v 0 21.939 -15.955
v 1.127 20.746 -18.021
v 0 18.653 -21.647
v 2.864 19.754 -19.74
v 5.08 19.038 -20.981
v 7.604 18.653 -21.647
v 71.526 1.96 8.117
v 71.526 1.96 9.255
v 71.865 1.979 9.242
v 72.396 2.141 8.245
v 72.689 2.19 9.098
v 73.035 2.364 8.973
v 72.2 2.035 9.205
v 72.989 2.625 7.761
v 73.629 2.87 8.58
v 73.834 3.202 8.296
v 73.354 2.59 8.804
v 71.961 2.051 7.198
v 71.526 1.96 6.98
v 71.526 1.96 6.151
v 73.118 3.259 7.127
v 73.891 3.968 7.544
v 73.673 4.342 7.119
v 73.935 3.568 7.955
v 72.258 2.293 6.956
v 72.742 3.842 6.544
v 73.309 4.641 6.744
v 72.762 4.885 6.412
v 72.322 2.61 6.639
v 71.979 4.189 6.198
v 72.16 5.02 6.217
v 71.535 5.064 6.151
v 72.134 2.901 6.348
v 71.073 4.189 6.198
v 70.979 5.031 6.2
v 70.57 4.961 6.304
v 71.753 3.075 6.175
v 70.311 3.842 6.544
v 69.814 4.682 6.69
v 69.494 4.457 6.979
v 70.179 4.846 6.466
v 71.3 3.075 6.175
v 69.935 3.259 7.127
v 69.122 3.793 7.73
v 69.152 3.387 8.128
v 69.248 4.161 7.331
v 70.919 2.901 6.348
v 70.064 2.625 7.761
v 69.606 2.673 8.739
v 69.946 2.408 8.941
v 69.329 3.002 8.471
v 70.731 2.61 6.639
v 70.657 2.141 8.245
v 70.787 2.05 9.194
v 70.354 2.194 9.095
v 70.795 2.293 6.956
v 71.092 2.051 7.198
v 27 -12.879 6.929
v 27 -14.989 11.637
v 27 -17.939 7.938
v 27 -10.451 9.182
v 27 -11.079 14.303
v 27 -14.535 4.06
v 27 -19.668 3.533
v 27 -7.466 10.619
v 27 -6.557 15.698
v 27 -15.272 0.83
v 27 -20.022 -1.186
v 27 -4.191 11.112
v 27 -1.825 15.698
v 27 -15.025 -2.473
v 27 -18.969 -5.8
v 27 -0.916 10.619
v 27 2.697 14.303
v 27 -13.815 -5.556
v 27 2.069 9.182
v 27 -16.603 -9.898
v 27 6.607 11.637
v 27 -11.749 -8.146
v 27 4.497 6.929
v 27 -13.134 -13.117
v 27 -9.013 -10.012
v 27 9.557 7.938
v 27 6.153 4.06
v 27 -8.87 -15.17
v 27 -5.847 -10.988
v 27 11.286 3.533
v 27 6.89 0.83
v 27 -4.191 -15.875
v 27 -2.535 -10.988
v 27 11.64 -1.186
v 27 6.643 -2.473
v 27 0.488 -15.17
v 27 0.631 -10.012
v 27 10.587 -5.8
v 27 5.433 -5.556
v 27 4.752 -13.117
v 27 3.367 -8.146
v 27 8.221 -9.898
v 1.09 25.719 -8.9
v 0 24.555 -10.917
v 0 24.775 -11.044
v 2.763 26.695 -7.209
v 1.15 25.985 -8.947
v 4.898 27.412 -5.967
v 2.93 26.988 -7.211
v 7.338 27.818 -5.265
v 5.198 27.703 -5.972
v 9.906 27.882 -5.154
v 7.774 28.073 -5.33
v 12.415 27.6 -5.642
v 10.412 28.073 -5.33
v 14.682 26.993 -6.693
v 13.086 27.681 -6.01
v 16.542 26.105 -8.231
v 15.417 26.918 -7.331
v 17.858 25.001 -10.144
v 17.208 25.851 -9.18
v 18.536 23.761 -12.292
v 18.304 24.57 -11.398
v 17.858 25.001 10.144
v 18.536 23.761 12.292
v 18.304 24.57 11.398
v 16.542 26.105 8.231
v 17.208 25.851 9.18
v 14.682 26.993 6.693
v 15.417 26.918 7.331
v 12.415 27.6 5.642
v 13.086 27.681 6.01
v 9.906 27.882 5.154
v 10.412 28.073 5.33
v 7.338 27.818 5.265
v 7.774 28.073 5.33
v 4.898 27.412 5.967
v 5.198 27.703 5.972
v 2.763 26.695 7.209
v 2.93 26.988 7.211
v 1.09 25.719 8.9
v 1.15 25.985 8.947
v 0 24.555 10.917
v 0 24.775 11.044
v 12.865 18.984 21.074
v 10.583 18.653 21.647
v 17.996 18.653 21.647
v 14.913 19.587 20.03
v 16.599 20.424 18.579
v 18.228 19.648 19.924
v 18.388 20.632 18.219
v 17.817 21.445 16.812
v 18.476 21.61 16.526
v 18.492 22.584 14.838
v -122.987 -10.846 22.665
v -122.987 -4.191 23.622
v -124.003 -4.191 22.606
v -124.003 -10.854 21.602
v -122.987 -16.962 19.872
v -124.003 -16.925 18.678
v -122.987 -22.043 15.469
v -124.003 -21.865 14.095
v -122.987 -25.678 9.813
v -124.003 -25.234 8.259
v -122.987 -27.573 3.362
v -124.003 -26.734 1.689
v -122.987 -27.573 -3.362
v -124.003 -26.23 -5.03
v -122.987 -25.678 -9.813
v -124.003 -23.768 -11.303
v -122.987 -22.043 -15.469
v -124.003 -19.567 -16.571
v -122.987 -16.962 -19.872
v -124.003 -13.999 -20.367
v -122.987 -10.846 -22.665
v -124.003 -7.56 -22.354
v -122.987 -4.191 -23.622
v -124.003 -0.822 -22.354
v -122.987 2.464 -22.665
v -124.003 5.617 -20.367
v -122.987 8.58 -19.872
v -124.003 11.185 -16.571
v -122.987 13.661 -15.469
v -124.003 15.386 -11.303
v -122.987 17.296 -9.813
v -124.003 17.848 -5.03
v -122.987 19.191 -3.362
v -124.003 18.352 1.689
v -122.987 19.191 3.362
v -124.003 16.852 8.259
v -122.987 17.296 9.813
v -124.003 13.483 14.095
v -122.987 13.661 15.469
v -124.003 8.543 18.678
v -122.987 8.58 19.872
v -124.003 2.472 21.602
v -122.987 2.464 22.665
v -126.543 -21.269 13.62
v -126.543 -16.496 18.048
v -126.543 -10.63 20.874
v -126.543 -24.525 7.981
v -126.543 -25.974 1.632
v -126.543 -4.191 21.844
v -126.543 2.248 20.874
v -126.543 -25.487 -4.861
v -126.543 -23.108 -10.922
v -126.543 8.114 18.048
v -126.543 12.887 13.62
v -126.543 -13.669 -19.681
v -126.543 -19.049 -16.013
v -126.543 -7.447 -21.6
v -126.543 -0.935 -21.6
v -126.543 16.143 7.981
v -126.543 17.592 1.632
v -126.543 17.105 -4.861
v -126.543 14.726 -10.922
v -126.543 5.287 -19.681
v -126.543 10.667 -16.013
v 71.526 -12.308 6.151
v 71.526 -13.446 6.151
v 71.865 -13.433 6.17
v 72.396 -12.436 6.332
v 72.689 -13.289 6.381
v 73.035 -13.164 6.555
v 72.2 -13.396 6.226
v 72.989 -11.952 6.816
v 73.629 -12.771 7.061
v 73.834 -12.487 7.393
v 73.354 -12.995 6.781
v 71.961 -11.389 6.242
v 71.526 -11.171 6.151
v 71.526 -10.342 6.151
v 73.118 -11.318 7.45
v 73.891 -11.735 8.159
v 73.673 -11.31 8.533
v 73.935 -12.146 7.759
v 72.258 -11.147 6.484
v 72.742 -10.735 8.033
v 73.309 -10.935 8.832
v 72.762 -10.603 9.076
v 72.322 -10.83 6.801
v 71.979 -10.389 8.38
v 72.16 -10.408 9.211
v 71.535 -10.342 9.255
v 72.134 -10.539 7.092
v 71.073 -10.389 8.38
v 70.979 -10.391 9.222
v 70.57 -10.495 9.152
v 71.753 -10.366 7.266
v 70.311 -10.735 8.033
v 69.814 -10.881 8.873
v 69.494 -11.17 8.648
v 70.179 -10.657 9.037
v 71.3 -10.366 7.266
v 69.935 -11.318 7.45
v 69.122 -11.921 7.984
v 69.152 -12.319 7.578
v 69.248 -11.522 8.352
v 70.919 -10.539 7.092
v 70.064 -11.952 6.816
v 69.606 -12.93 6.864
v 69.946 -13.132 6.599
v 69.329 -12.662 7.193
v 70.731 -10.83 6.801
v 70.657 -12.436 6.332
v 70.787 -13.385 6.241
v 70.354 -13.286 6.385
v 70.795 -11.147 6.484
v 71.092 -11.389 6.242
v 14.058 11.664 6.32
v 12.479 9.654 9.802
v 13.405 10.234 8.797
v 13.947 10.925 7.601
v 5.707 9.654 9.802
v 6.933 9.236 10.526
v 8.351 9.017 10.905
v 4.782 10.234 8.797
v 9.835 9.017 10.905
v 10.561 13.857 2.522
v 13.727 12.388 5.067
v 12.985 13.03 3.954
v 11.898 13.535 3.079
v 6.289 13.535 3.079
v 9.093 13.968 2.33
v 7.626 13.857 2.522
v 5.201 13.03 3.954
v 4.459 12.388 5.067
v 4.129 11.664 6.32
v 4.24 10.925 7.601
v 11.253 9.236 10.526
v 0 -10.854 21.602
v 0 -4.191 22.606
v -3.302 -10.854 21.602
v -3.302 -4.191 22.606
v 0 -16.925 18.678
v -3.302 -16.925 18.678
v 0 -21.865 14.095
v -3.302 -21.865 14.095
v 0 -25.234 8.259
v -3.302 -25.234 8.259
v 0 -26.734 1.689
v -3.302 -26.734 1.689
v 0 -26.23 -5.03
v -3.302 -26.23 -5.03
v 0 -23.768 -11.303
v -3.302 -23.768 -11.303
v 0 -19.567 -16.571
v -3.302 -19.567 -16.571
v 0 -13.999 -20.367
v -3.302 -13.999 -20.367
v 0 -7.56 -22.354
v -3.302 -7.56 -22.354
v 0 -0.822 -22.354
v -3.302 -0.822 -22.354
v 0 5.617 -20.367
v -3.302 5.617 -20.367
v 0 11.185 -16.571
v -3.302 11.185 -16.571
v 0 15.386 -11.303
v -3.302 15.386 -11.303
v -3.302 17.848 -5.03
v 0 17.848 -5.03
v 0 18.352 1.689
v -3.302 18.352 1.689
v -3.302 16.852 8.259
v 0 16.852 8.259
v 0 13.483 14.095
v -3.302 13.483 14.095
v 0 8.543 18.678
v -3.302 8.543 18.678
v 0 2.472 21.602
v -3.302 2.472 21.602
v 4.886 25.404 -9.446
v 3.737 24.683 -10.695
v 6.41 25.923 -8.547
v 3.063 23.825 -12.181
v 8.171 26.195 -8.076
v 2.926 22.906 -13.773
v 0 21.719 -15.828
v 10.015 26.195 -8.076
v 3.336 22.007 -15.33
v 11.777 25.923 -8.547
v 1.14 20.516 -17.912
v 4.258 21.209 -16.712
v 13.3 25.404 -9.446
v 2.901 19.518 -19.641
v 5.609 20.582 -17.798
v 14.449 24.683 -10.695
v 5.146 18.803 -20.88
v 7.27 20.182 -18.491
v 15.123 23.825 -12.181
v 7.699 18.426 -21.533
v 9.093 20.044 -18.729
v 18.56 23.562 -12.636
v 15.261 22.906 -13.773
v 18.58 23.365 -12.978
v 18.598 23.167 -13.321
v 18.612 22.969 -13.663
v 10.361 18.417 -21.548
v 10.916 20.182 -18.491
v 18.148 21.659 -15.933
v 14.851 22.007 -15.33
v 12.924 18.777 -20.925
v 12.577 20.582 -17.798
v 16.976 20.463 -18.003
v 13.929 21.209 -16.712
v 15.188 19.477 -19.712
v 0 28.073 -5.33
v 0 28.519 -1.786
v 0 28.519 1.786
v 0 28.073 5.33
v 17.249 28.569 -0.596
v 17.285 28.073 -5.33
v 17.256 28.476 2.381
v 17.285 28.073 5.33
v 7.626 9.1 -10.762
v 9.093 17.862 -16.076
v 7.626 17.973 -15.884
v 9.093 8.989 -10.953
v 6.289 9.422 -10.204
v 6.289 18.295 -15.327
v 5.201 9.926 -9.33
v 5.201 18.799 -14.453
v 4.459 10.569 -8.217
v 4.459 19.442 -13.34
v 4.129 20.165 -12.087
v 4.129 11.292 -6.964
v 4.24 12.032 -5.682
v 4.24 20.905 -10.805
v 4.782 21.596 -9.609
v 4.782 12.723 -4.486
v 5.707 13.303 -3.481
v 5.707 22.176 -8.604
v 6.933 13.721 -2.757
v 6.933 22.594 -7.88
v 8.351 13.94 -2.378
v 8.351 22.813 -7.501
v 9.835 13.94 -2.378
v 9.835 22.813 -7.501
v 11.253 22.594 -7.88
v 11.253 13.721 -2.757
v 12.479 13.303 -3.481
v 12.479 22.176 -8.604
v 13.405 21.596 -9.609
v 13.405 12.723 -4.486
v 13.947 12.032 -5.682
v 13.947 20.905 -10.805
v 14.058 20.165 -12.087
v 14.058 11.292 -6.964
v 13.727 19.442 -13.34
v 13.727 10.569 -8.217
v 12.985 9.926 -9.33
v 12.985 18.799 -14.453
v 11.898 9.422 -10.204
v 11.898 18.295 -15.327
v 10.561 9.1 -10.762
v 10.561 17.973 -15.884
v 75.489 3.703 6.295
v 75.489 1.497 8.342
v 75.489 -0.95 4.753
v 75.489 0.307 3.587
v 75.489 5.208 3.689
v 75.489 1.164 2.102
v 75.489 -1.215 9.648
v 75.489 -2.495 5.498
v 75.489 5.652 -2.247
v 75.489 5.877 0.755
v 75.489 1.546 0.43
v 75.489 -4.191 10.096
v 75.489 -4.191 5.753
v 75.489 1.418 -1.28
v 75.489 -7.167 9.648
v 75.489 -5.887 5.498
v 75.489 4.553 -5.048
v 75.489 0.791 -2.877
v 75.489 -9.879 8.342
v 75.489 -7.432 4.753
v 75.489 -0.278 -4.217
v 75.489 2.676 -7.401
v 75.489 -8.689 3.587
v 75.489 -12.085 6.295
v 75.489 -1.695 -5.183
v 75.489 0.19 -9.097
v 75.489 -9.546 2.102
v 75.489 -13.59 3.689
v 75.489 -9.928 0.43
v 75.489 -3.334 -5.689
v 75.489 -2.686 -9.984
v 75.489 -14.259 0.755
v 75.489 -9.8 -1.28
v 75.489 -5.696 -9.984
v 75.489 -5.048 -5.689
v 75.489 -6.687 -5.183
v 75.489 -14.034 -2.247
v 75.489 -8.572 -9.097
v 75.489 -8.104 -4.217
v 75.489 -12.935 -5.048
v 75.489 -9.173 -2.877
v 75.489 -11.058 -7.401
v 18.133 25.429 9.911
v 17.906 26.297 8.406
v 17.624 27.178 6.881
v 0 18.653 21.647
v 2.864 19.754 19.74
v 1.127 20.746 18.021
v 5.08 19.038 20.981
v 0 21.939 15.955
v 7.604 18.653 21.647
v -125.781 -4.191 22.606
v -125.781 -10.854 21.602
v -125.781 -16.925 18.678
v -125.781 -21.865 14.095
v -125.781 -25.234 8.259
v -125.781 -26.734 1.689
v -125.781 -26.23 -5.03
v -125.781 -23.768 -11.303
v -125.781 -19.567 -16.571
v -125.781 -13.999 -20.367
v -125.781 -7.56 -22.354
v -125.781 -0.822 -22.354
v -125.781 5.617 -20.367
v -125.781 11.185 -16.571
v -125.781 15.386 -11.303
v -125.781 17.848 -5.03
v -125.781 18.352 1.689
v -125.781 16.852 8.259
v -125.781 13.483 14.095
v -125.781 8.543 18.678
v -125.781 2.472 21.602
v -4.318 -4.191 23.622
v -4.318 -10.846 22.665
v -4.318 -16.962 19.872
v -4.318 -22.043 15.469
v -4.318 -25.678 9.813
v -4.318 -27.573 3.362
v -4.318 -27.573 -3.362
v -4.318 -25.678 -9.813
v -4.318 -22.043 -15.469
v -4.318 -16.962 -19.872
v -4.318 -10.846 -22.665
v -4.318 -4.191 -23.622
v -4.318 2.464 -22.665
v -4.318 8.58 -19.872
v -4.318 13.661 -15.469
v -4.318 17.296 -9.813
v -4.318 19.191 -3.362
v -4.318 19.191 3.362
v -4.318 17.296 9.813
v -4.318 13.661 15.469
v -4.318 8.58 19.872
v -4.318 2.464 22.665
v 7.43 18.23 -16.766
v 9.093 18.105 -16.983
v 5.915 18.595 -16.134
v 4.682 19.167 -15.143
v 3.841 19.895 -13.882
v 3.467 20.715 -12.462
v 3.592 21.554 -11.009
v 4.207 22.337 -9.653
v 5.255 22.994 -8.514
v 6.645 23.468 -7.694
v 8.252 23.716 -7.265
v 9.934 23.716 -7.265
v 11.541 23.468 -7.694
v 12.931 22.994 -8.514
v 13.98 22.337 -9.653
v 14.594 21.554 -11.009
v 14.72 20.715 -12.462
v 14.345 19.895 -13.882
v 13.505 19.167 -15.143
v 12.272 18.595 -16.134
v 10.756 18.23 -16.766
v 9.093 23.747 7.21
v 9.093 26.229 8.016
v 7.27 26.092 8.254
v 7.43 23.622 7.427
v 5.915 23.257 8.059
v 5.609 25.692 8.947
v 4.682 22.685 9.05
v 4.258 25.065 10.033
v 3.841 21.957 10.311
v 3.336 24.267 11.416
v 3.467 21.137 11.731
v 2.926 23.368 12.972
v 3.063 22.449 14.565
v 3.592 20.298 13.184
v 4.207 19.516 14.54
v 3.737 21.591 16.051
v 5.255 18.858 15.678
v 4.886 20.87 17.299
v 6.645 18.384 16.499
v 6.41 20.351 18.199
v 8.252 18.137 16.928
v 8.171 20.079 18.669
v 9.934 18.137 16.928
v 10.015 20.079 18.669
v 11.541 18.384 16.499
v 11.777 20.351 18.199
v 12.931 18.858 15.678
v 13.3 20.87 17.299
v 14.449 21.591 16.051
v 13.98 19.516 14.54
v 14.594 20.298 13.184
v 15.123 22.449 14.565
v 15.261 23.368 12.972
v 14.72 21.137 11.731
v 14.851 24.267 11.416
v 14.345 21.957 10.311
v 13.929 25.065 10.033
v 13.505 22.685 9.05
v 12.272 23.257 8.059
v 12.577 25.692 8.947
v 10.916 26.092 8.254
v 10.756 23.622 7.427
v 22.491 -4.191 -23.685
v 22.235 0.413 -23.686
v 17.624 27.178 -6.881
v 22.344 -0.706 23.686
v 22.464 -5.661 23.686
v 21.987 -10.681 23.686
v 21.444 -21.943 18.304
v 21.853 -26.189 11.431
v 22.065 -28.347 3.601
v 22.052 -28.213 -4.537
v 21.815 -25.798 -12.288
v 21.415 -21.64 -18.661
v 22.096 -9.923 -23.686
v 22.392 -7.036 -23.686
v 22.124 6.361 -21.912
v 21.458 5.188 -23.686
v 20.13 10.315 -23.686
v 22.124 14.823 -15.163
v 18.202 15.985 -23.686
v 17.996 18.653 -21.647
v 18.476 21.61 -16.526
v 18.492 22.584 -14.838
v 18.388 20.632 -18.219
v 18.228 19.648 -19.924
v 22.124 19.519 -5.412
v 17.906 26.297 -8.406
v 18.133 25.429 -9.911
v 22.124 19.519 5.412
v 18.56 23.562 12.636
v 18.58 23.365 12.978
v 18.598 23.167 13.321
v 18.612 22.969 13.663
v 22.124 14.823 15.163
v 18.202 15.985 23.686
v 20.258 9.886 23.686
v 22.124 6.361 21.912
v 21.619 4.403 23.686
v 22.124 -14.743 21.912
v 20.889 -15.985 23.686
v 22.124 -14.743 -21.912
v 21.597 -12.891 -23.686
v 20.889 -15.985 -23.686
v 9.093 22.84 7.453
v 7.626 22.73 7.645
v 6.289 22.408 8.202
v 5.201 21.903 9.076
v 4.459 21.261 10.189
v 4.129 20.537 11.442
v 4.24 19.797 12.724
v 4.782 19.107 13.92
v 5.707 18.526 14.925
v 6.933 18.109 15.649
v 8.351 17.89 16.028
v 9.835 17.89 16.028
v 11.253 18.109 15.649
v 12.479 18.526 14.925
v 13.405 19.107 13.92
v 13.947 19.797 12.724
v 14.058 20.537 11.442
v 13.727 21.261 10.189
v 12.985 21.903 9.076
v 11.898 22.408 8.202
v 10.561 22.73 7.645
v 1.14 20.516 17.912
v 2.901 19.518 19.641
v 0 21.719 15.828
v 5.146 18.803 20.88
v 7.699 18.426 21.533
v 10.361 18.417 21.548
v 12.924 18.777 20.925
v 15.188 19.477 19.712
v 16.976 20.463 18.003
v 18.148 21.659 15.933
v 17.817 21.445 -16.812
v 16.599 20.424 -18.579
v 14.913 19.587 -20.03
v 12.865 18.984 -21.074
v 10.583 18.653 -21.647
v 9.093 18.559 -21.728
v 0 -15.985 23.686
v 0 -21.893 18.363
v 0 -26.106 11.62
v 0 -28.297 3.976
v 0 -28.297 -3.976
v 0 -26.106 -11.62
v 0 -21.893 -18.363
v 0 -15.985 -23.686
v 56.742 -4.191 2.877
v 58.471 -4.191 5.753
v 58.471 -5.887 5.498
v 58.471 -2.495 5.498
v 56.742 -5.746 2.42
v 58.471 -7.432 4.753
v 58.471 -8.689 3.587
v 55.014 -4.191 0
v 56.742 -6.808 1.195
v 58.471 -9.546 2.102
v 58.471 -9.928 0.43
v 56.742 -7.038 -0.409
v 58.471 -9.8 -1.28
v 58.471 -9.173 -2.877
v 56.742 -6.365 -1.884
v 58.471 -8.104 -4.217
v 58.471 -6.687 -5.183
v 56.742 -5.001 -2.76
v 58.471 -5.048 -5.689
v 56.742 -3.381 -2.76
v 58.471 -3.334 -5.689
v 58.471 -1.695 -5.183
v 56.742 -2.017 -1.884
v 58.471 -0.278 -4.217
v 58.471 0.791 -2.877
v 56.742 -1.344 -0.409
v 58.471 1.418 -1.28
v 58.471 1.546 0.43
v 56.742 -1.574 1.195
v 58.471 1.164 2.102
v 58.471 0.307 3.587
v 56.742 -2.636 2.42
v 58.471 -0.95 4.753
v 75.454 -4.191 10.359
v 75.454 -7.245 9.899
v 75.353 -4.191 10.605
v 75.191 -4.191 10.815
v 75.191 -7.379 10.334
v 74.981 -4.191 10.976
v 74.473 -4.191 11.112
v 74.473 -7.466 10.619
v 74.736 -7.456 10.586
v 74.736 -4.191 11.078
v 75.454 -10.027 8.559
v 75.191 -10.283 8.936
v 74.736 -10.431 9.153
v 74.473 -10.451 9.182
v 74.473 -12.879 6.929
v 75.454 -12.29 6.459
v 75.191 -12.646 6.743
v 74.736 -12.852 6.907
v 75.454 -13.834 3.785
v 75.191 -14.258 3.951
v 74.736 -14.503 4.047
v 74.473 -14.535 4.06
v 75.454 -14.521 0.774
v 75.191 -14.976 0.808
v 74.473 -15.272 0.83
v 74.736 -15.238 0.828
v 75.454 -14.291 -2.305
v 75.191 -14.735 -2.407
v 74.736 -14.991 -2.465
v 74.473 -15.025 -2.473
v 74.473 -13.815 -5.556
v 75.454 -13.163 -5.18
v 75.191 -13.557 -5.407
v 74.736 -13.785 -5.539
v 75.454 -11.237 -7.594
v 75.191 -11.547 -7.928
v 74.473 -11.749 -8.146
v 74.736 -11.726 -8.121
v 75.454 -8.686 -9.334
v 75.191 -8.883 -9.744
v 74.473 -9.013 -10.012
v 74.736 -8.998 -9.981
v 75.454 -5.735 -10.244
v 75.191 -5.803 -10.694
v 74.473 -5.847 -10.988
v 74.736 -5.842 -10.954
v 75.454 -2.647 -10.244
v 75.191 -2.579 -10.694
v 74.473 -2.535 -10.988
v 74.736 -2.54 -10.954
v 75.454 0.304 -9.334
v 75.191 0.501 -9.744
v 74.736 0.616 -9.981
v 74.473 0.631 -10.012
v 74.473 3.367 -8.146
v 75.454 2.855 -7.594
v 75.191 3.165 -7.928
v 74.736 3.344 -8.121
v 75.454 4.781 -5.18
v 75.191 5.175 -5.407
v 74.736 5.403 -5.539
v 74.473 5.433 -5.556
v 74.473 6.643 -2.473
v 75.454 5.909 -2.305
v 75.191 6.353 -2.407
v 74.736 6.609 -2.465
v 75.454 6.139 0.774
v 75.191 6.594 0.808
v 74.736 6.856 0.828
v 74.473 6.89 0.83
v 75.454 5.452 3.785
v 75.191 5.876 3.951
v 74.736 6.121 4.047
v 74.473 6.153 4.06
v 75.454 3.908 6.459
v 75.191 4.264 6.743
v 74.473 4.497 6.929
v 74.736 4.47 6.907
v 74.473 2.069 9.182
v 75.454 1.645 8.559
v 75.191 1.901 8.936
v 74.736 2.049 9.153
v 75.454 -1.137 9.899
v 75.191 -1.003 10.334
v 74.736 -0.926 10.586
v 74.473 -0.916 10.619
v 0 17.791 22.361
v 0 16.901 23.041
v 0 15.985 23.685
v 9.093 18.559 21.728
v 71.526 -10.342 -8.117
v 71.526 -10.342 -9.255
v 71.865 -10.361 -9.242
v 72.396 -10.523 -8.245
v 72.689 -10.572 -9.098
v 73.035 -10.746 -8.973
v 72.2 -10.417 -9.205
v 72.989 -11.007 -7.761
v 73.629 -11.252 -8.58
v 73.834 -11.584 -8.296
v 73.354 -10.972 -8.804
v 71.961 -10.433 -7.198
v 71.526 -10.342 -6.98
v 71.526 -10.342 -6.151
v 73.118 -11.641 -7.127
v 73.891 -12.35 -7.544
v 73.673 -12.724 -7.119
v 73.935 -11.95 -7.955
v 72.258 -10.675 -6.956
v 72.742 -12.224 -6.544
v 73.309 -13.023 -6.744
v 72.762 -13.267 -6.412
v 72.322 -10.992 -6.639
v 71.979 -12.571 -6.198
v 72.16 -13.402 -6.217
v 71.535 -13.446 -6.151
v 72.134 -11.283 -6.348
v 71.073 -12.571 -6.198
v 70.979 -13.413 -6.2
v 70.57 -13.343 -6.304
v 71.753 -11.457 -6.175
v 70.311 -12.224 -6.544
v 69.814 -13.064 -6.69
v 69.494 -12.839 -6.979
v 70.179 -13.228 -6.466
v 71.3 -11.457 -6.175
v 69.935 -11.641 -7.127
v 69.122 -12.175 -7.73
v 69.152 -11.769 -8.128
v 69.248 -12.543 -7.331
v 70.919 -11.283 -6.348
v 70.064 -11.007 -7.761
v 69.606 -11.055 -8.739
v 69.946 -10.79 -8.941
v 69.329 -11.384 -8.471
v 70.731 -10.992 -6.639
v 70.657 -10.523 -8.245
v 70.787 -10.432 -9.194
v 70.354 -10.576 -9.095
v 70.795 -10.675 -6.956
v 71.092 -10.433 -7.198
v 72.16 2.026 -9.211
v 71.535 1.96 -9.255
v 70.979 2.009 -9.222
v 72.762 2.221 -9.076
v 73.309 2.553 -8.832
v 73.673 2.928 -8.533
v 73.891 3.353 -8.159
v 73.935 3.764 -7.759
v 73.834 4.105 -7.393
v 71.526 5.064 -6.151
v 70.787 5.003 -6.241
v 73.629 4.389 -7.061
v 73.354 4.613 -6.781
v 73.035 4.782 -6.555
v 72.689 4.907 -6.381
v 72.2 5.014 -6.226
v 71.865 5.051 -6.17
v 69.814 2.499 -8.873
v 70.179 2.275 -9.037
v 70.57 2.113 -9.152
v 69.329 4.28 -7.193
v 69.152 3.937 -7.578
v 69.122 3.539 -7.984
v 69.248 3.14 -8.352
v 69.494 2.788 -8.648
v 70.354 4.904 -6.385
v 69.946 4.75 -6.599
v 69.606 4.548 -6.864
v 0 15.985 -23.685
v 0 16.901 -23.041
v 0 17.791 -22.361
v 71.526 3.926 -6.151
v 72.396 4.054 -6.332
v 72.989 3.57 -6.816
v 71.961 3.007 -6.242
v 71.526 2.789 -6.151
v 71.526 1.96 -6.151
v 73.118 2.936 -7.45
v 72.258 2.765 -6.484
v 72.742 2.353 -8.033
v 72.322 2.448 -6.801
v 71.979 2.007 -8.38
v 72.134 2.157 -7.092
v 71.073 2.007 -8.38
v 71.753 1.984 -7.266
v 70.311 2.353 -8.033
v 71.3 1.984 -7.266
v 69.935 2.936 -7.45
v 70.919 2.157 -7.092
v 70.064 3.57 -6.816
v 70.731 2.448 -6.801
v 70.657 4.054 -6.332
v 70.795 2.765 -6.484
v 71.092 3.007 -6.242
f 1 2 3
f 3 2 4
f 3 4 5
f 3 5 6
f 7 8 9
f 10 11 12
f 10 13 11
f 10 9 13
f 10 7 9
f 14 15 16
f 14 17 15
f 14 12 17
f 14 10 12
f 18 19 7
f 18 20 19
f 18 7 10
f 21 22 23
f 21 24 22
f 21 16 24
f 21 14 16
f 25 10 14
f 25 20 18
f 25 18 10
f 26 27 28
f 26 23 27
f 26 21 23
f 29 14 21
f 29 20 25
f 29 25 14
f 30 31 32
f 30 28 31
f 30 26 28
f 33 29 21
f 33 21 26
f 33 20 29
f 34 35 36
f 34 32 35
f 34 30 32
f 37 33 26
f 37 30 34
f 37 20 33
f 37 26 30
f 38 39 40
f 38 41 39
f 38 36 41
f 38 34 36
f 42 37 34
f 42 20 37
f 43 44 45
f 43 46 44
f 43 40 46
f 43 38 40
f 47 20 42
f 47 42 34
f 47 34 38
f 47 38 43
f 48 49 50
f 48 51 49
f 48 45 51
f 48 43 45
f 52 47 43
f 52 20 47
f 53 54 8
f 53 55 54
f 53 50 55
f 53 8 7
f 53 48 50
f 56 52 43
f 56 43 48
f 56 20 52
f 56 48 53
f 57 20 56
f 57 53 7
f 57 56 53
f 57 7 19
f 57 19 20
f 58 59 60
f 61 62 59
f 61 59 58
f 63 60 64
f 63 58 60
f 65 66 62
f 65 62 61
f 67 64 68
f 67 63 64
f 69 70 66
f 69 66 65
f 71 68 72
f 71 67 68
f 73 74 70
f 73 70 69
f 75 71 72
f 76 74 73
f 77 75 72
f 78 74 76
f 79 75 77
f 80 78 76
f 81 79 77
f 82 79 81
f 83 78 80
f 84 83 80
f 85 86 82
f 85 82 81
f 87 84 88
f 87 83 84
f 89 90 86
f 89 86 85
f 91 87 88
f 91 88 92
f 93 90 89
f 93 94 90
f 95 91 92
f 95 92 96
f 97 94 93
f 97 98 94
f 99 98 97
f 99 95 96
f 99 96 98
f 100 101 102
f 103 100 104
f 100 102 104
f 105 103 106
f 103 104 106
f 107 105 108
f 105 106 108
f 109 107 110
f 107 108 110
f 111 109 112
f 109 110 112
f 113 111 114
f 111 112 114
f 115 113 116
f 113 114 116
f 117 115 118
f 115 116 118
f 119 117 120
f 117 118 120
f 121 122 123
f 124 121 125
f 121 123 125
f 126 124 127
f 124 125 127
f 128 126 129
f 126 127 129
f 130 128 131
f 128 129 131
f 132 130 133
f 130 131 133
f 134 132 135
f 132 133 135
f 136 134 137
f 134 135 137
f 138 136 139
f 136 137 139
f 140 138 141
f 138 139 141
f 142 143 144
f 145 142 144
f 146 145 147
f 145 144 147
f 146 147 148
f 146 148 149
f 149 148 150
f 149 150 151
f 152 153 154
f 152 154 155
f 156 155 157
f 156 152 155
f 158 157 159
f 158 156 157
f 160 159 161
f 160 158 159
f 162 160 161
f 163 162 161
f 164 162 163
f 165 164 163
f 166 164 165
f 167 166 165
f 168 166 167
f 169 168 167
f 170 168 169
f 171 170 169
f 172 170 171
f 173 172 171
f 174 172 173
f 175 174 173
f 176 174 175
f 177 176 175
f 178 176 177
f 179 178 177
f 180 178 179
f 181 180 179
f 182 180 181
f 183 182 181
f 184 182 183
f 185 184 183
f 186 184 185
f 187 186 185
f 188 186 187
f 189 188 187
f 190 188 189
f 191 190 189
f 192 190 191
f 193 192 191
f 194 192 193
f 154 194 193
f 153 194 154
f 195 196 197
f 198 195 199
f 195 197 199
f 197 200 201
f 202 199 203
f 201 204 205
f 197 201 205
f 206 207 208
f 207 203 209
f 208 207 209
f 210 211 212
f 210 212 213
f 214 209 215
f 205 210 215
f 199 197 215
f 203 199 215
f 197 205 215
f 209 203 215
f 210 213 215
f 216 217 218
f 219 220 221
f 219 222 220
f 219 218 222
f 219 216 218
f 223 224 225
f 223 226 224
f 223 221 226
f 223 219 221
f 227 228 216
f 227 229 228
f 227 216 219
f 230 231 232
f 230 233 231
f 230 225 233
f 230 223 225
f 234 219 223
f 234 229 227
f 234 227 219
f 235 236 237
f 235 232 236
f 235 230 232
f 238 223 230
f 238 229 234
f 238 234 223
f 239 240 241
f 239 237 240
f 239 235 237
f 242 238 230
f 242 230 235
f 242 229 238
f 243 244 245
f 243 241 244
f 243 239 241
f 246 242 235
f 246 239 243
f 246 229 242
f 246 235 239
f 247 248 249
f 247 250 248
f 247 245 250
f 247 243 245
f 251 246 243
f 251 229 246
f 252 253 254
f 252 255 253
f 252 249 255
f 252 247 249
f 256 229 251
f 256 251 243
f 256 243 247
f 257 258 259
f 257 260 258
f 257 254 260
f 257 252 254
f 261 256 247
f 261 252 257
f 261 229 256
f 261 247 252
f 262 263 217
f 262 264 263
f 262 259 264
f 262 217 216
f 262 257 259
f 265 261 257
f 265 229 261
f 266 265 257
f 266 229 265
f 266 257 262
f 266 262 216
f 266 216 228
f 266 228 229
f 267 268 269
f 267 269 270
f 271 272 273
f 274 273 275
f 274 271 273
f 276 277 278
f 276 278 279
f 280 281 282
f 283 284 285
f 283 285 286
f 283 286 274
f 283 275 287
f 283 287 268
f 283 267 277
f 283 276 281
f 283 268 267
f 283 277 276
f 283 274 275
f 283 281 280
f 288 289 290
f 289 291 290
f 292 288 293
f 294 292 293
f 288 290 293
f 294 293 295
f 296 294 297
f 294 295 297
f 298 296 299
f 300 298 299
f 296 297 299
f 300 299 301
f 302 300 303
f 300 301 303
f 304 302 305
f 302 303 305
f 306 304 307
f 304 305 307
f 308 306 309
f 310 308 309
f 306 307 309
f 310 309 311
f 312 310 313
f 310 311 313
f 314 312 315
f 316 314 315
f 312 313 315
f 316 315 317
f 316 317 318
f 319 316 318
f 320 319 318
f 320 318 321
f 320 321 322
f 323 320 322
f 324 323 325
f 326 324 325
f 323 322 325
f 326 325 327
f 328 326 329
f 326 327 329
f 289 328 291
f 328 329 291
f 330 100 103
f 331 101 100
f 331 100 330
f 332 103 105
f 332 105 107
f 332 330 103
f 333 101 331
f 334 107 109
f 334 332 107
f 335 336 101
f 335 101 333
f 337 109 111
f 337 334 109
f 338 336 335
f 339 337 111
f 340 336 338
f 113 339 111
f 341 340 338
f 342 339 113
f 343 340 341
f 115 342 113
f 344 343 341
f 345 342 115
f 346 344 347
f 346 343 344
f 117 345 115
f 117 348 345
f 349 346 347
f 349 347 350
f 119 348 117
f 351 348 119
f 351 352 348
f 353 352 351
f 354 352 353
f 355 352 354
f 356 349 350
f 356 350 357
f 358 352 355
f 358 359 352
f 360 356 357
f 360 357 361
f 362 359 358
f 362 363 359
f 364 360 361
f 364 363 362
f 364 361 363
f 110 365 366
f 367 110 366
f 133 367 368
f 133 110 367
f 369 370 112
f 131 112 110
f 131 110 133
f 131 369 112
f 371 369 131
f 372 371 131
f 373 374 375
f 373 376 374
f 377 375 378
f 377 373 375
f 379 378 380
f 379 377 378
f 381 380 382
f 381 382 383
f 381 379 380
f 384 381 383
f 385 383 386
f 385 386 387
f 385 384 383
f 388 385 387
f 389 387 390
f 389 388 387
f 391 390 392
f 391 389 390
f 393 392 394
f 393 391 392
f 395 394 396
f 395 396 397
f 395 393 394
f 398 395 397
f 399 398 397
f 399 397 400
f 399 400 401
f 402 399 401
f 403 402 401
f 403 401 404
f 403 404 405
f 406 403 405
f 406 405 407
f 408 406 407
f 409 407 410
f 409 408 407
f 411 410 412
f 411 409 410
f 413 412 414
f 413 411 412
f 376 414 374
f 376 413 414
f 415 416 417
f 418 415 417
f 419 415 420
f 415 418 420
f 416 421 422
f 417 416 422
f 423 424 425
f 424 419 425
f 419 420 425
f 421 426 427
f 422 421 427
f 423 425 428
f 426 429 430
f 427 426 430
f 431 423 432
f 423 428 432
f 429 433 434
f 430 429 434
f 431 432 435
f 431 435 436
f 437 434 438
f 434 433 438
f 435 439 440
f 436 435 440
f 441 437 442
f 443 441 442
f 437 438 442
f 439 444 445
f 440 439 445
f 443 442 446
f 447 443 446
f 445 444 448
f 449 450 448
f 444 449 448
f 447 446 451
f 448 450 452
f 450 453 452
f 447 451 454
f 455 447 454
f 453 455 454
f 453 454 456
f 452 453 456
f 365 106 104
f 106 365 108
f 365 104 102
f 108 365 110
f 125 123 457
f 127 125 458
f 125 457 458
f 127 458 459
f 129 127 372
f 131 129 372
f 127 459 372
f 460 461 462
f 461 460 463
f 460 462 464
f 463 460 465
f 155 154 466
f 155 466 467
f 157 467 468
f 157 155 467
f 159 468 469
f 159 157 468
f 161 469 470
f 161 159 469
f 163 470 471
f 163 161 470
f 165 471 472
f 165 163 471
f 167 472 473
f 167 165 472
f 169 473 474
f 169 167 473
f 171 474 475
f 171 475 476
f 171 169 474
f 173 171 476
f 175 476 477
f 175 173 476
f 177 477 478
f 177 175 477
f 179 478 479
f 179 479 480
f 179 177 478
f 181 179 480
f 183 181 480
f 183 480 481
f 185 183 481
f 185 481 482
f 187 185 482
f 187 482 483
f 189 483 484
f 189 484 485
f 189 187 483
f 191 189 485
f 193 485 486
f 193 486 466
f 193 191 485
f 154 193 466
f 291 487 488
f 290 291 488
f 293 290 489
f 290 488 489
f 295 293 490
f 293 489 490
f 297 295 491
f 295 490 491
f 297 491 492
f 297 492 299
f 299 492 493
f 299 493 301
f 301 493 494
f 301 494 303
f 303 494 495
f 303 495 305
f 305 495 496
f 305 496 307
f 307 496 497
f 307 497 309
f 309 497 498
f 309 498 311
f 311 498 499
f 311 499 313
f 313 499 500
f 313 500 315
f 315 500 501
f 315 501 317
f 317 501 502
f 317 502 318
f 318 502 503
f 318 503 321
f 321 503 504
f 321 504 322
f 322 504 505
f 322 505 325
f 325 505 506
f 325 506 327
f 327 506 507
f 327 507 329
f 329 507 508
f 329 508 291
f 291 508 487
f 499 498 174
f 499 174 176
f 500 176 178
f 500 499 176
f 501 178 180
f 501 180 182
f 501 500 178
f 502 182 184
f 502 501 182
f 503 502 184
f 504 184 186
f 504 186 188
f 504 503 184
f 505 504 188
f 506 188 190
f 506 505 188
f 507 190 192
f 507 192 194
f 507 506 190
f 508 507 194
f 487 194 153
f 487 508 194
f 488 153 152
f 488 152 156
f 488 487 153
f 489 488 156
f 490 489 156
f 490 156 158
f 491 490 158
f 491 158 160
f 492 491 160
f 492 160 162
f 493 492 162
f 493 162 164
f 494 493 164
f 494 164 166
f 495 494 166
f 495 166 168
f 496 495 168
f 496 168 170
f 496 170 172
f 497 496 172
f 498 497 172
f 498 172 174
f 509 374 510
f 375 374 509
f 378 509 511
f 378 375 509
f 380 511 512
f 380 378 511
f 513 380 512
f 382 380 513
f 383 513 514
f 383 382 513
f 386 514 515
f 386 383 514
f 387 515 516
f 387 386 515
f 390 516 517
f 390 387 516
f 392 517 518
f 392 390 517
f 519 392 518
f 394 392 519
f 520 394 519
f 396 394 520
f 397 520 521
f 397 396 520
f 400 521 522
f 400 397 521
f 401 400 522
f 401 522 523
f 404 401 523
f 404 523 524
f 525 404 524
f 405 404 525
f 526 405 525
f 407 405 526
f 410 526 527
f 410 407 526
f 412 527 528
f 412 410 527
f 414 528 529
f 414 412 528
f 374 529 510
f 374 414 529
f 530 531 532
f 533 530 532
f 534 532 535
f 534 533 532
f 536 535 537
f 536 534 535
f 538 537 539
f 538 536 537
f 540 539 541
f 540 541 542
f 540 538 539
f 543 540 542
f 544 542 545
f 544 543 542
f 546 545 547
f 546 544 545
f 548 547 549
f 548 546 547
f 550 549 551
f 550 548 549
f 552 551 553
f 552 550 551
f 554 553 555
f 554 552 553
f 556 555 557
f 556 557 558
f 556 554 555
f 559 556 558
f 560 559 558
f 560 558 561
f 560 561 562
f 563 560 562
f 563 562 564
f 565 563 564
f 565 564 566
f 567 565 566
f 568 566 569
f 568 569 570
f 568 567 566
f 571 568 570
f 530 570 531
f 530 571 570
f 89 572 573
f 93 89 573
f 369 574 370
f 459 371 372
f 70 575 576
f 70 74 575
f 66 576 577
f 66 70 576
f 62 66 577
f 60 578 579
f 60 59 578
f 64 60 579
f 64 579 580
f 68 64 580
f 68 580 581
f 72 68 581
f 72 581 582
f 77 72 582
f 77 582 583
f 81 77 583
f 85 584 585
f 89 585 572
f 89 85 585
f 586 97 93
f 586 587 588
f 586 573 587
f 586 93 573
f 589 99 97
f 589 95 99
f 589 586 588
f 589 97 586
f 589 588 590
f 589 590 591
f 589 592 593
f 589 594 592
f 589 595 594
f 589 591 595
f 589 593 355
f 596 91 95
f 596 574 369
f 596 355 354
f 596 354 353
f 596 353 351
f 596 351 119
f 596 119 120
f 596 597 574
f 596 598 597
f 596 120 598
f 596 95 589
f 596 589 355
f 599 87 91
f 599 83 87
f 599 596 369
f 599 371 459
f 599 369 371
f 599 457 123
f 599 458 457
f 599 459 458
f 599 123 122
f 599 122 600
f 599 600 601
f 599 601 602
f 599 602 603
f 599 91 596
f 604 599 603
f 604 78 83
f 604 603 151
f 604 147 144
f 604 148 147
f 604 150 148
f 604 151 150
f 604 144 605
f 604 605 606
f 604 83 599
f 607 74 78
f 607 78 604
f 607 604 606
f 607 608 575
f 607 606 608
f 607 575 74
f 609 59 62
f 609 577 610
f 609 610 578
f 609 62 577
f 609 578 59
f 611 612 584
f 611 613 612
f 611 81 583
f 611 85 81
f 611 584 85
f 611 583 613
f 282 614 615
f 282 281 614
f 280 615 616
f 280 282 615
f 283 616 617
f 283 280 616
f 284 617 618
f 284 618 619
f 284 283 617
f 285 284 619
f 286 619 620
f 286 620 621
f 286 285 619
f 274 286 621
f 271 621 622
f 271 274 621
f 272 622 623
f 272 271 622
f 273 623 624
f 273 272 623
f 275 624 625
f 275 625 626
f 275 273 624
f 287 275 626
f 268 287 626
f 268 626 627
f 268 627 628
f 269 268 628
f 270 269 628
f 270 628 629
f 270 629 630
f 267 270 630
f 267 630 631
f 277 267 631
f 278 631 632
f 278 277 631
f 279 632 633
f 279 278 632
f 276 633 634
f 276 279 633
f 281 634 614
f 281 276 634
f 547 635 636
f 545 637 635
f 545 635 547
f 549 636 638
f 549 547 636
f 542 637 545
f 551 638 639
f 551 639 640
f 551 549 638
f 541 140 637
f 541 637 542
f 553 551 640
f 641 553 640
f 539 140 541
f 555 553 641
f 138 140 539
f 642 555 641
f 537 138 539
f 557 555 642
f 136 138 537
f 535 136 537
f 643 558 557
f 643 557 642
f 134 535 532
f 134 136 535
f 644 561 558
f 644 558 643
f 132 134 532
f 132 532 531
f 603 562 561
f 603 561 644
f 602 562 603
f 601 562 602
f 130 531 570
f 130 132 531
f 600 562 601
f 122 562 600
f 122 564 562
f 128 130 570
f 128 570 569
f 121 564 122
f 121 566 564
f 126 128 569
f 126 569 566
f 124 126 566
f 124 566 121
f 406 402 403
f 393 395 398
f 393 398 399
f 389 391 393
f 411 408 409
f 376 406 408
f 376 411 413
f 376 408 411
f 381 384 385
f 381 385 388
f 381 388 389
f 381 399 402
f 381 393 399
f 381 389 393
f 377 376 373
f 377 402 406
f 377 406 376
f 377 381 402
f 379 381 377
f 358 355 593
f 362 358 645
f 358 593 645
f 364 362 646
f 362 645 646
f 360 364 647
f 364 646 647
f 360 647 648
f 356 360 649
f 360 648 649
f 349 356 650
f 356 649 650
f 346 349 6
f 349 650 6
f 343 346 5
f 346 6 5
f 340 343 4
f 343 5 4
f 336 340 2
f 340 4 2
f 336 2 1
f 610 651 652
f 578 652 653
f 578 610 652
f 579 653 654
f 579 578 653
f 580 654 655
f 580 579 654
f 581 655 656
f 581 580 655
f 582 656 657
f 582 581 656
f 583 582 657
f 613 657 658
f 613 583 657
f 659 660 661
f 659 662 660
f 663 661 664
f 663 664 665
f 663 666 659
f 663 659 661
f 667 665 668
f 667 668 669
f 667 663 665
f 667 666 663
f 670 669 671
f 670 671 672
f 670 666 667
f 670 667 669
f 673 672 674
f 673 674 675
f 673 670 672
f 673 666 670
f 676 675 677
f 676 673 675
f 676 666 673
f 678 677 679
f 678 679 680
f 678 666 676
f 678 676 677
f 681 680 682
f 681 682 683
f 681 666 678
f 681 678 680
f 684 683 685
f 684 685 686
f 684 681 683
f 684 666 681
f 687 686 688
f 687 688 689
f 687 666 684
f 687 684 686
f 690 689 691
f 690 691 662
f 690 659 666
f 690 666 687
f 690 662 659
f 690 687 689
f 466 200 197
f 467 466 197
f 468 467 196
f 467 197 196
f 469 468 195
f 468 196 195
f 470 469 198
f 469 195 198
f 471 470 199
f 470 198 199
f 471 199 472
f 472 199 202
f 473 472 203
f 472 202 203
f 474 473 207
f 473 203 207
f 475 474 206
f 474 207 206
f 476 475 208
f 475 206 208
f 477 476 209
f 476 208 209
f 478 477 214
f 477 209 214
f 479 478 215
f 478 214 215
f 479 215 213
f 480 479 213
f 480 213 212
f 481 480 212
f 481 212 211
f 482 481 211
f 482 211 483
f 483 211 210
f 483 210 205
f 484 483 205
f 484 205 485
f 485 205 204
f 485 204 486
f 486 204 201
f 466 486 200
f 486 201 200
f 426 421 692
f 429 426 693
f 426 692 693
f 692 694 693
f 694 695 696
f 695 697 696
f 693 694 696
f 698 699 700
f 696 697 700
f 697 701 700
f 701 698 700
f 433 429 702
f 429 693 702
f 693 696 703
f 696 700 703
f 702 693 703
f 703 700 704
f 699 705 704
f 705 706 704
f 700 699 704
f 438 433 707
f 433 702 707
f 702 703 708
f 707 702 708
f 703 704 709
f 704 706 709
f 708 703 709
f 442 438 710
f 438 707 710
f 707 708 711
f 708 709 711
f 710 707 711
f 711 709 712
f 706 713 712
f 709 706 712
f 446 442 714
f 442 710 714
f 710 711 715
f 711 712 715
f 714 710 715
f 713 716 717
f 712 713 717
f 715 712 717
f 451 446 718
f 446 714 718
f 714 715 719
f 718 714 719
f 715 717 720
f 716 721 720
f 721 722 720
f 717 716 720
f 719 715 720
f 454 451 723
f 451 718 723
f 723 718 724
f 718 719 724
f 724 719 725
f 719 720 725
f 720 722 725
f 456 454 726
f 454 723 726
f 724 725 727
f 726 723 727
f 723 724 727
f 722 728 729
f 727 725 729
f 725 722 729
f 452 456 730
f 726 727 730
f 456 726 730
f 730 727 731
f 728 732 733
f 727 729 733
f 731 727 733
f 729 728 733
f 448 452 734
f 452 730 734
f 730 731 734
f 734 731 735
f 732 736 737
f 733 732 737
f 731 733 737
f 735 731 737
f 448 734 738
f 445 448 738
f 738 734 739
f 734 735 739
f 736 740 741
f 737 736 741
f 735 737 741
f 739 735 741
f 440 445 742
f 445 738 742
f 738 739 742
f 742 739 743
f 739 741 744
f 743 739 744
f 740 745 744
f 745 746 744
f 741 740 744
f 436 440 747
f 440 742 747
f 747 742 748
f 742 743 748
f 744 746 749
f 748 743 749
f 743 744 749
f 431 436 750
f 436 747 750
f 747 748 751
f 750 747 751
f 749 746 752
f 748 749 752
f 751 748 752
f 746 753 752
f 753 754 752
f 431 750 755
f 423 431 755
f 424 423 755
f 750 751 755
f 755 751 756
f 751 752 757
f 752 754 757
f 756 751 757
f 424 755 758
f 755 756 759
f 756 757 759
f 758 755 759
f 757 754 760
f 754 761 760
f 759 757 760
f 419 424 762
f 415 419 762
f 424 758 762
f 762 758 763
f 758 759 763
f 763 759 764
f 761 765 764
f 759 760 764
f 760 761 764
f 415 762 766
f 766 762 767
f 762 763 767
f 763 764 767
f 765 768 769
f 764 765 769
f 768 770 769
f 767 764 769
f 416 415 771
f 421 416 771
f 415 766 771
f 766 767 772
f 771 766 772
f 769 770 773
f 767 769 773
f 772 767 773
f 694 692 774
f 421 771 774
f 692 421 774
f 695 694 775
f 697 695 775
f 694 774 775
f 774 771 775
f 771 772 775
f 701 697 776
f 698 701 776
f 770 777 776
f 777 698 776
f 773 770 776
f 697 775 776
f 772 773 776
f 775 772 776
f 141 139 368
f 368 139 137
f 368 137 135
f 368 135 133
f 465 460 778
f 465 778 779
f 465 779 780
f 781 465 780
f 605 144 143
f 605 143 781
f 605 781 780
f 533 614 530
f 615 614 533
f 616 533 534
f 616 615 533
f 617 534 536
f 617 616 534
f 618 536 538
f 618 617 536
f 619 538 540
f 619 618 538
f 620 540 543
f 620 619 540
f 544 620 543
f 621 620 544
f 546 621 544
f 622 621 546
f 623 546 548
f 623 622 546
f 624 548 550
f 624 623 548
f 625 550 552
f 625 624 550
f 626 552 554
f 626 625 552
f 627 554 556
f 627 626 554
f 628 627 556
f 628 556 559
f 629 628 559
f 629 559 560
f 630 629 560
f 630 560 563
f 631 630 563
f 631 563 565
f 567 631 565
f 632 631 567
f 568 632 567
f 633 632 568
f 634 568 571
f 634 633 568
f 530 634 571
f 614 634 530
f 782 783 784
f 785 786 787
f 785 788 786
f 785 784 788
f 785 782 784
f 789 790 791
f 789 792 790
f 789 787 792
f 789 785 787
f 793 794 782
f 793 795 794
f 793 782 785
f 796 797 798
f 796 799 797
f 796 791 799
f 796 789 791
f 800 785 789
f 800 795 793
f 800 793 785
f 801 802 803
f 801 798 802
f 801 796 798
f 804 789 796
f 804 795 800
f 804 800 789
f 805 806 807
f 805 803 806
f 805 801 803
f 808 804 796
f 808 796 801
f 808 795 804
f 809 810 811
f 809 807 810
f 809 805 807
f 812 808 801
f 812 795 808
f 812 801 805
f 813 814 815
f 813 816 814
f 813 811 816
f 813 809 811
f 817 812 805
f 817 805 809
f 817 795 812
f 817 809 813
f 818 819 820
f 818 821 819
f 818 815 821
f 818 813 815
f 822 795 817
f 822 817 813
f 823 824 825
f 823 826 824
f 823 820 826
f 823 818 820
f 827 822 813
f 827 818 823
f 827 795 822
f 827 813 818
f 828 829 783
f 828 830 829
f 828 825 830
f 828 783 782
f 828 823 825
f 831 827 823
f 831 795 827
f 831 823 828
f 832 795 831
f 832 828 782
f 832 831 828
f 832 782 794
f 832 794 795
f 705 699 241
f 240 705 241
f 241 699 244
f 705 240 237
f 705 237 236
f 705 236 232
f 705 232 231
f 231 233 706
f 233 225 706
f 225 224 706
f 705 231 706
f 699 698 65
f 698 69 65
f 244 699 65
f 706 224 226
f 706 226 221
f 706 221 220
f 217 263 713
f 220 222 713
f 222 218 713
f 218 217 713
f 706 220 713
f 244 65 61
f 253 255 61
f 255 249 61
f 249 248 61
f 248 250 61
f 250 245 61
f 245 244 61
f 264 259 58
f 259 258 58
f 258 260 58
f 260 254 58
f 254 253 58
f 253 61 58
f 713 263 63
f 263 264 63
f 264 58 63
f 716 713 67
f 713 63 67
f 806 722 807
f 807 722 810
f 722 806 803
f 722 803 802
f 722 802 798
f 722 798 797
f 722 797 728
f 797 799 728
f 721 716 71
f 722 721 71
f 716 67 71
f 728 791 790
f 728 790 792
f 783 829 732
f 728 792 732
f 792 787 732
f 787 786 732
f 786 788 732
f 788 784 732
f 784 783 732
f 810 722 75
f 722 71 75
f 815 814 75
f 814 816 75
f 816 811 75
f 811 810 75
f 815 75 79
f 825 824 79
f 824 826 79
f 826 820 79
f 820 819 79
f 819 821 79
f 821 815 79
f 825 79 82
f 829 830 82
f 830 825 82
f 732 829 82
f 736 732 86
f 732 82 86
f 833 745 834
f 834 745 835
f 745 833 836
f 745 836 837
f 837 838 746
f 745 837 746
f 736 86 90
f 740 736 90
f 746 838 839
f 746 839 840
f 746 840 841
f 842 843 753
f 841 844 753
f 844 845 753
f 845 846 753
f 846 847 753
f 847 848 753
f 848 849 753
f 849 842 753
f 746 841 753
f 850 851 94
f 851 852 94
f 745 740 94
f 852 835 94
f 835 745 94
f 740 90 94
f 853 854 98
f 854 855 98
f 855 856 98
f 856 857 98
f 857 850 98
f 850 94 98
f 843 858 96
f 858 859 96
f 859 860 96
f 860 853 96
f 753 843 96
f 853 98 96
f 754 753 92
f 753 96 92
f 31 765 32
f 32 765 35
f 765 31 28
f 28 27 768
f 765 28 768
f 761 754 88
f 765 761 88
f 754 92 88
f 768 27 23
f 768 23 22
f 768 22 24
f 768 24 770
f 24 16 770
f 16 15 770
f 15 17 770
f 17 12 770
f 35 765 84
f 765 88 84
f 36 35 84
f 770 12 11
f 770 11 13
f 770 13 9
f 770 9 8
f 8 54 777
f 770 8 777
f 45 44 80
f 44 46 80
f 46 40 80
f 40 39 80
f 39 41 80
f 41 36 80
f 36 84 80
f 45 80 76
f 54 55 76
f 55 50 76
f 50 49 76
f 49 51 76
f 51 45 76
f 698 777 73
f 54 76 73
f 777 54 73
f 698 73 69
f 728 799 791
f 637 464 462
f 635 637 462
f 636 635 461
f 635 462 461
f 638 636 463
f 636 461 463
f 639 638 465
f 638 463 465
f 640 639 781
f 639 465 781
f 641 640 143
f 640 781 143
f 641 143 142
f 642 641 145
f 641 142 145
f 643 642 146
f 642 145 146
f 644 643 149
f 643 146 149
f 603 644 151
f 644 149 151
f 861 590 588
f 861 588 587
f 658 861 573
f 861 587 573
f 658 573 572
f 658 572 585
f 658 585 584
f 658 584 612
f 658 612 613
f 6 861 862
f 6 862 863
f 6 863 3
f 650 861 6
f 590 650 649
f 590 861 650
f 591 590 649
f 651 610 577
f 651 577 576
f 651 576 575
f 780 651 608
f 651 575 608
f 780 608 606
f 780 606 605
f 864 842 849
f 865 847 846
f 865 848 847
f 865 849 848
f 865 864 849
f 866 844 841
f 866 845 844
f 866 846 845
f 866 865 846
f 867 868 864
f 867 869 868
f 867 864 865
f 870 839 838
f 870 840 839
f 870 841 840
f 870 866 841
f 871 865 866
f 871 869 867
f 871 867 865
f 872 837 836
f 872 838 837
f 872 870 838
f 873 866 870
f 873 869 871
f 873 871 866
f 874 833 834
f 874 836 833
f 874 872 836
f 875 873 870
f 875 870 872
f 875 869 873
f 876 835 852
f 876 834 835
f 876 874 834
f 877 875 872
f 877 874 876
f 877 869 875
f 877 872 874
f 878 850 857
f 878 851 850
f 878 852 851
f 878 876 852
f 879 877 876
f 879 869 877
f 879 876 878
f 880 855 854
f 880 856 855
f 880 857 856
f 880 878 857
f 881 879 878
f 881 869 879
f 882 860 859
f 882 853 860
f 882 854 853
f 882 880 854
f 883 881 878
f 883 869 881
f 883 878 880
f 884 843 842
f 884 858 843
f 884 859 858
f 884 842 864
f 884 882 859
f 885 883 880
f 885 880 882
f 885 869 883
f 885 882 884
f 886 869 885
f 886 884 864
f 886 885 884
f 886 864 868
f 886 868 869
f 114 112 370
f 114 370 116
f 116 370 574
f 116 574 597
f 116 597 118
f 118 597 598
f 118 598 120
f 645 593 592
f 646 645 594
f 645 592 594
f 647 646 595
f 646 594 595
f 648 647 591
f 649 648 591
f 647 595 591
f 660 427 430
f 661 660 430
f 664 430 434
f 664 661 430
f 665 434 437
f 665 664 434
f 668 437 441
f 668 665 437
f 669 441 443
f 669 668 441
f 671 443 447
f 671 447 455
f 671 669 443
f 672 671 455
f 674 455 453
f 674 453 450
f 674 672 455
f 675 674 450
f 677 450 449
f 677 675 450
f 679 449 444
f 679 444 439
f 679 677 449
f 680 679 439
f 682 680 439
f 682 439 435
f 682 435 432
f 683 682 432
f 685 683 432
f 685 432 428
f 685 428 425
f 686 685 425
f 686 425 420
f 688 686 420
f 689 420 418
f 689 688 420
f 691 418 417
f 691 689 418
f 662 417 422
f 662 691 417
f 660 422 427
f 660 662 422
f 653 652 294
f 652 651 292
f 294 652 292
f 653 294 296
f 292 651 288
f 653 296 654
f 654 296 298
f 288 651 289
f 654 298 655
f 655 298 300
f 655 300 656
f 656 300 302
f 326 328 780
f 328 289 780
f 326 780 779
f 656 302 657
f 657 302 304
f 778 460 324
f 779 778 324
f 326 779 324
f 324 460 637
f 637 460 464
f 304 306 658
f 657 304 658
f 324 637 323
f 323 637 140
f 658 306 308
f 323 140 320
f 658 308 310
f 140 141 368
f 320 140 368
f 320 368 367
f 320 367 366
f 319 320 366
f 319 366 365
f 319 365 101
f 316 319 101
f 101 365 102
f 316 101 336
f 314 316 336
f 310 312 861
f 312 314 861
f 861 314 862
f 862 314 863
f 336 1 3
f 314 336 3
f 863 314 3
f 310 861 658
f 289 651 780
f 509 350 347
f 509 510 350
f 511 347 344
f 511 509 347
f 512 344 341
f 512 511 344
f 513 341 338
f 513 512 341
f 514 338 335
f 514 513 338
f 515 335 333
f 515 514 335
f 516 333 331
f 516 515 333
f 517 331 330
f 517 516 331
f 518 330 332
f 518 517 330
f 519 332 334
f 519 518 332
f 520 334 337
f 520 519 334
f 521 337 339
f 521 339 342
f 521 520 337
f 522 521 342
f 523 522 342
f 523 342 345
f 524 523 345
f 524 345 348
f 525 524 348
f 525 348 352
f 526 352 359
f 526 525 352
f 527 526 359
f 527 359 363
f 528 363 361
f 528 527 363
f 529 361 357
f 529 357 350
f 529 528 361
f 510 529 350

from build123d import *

# Parameters (mm, degrees)
SKETCH1_R           = 28.575
EXTRUDE1_DEPTH      = 27.0002
EXTRUDE1_DEPTH_BACK = 126.5428
CUT_EXTRUDE1_REACH  = 128.543
SKETCH2_R           = 28.575
SKETCH2_R_2         = 23.622
CUT_EXTRUDE3_START  = -27.0002
CUT_EXTRUDE3_DEPTH  = 27.0002
SKETCH18_R          = 9.525
CUT_EXTRUDE4_DEPTH  = 0.254
SKETCH19_R          = 9.525
CUT_EXTRUDE5_DEPTH  = 0.254
CHAMFER1_SIZE       = 0.762
CIRPATTERN1_COUNT   = 4


with BuildPart() as part:
    # Sketch1 → Extrude1 (new body, two sides)
    with BuildSketch(Plane(origin=(0, 0, 0), x_dir=(0, 0, -1), z_dir=(1, 0, 0))) as extrude1_sk:
        Circle(SKETCH1_R)
    extrude(amount=EXTRUDE1_DEPTH)
    extrude(extrude1_sk.sketch, amount=-EXTRUDE1_DEPTH_BACK)

    # Sketch2 → Cut-Extrude1 (cut, up to next)
    with BuildSketch(Plane(origin=(0, 0, 0), x_dir=(0, 0, -1), z_dir=(1, 0, 0)), mode=Mode.PRIVATE) as cut_extrude1_sk1:
        Circle(SKETCH2_R)
        with Locations((0, -4.191)):
            Circle(SKETCH2_R_2, mode=Mode.SUBTRACT)
    cut_extrude1_tool1 = extrude(cut_extrude1_sk1.sketch, amount=-CUT_EXTRUDE1_REACH, mode=Mode.PRIVATE) & part.part
    add(cut_extrude1_tool1.solids().sort_by_distance((0, 0, 27.766777))[0], mode=Mode.SUBTRACT)

    # Sketch4 → Cut-Extrude3 (cut)
    with BuildSketch(Plane.ZY.offset(CUT_EXTRUDE3_START)):
        with BuildLine():
            Line((23.6855, -25.666178421), (23.6855, 17.476089577))
            Line((23.6855, 17.476089577), (0, 31.150919378))
            Line((0, 31.150919378), (-23.6855, 17.476089577))
            Line((-23.6855, 17.476089577), (-23.6855, -25.666178421))
            ThreePointArc((-23.6855, -25.666178421), (0, 34.925), (23.6855, -25.666178421))
        make_face()
    extrude(amount=CUT_EXTRUDE3_DEPTH, mode=Mode.SUBTRACT)

    # Sketch6 → Cut-Revolve2 (revolve, cut)
    with BuildSketch(Plane.XY, mode=Mode.PRIVATE) as cut_revolve2_sk:
        Polygon((0.750392661, 57.15), (27.0002, 11.684), (27.0002, 57.15), align=None)
    revolve(cut_revolve2_sk.sketch.rotate(Axis((-0.562097706, -4.191, 0), (1, 0, 0)), 270), axis=Axis((-0.562097706, -4.191, 0), (1, 0, 0)), mode=Mode.SUBTRACT)  # turned: the seam where the file's is

    # S2D0002 → Cut-Revolve3 (revolve, cut)
    with BuildSketch(Plane(origin=(9.0932, 23.136869081, 13.372742289), x_dir=(0, 0.5, -0.866025404), z_dir=(1, 0, 0))):
        Polygon((0, 0), (6.1849, 0), (5.642306865, -2.5527), (4.9784, -3.216606865), (4.9784, -13.462), (0, -13.462), align=None)
    revolve(axis=Axis((9.0932, 10.895513396, 6.305192289), (0, 0.866025404, 0.5)), mode=Mode.SUBTRACT)

    # Sketch8 → Cut-Revolve4 (revolve, cut)
    with BuildSketch(Plane(origin=(9.0932, 23.136869081, -13.372742289), x_dir=(0, -0.5, -0.866025404), z_dir=(1, 0, 0))):
        Polygon((0, 0), (6.1849, 0), (5.642306865, -2.5527), (4.9784, -3.216606865), (4.9784, -13.462), (0, -13.462), align=None)
    revolve(axis=Axis((9.0932, 10.895513396, -6.305192289), (0, 0.866025404, -0.5)), mode=Mode.SUBTRACT)

    # Sketch18 → Cut-Extrude4 (cut)
    with BuildSketch(Plane(origin=(0, 23.363189534, 13.488743766), x_dir=(1, 0, 0), z_dir=(0, 0.866025404, 0.5))):
        with Locations((9.0932, -0.0127)):
            Circle(SKETCH18_R)
    extrude(amount=-CUT_EXTRUDE4_DEPTH, mode=Mode.SUBTRACT)

    # Sketch19 → Cut-Extrude5 (cut)
    with BuildSketch(Plane(origin=(0, 23.363189534, -13.488743766), x_dir=(1, 0, 0), z_dir=(0, 0.866025404, -0.5))):
        with Locations((9.0932, 0.0127)):
            Circle(SKETCH19_R)
    extrude(amount=-CUT_EXTRUDE5_DEPTH, mode=Mode.SUBTRACT)

    # Sketch10 → Cut-Revolve6 (revolve, cut)
    with BuildSketch(Plane.XY, mode=Mode.PRIVATE) as cut_revolve6_sk:
        Polygon((0, 19.431), (0, 18.415), (-3.302, 18.415), (-4.318, 19.431), align=None)
    revolve(cut_revolve6_sk.sketch.rotate(Axis((-4.5339, -4.191, 0), (1, 0, 0)), 90), axis=Axis((-4.5339, -4.191, 0), (1, 0, 0)), mode=Mode.SUBTRACT)  # turned: the seam where the file's is

    # Sketch12 → Cut-Revolve8 (revolve, cut)
    with BuildSketch(Plane.XY, mode=Mode.PRIVATE) as cut_revolve8_sk:
        Polygon((-126.5428, 19.431), (-126.5428, 18.415), (-124.0028, 18.415), (-122.9868, 19.431), align=None)
    revolve(cut_revolve8_sk.sketch.rotate(Axis((-84.3026, -4.191, 0), (1, 0, 0)), 90), axis=Axis((-84.3026, -4.191, 0), (1, 0, 0)), mode=Mode.SUBTRACT)  # turned: the seam where the file's is

    # Chamfer1
    chamfer1_edges = [part.edges().sort_by_distance(p)[0] for p in [
        (-126.5428, -4.191, -22.606),
    ]]
    chamfer(chamfer1_edges, length=CHAMFER1_SIZE)

    # Sketch13 → Revolve1 (revolve)
    with BuildSketch(Plane(origin=(0, 0, 0), x_dir=(0, -1, 0), z_dir=(0, 0, 1)), mode=Mode.PRIVATE) as revolve1_sk:
        with BuildLine():
            Line((4.191, 27.0002), (4.191, 75.4888))
            Line((4.191, 75.4888), (14.2875, 75.4888))
            ThreePointArc((14.2875, 75.4888), (15.00592049, 75.19122049), (15.3035, 74.4728))
            Line((15.3035, 74.4728), (15.3035, 27.0002))
            Line((15.3035, 27.0002), (4.191, 27.0002))
        make_face()
    revolve(revolve1_sk.sketch.rotate(Axis((25.10663, -4.191, 0), (1, 0, 0)), 270), axis=Axis((25.10663, -4.191, 0), (1, 0, 0)))  # turned: the seam where the file's is

    # S2D0001 → Cut-Revolve9 (revolve, cut)
    with BuildSketch(Plane(origin=(64.8716, -9.9441, 0), x_dir=(0, -1, 0), z_dir=(0, 0, 1)), mode=Mode.PRIVATE) as cut_revolve9_sk:
        Polygon((0, 10.6172), (0, -6.4008), (-5.7531, -9.857611227), (-5.7531, 10.6172), align=None)
    revolve(cut_revolve9_sk.sketch.rotate(Axis((43.373048211, -4.191, 0), (1, 0, 0)), 270), axis=Axis((43.373048211, -4.191, 0), (1, 0, 0)), mode=Mode.SUBTRACT)  # turned: the seam where the file's is

    # Sketch16 → Cut-Revolve10 (revolve, cut)
    with BuildSketch(Plane(origin=(60.9092, 3.666724106, -7.857724106), x_dir=(-1, 0, 0), z_dir=(0, -0.707106781, -0.707106781)), mode=Mode.PRIVATE) as cut_revolve10_sk:
        Polygon((-10.6172, 0), (-8.2042, 0), (-10.6172, -2.413), align=None)
    cut_revolve10 = revolve(cut_revolve10_sk.sketch.rotate(Axis((71.5264, 0.494324135, -4.685324135), (0, 0.707106781, -0.707106781)), 90), axis=Axis((71.5264, 0.494324135, -4.685324135), (0, 0.707106781, -0.707106781)), mode=Mode.SUBTRACT)  # turned: the seam where the file's is

    # CirPattern1: Cut-Revolve10 ×4 about axis
    cirpattern1_axis = Axis((25.10663, -4.191, 0), (-1, 0, 0))
    for i in range(1, CIRPATTERN1_COUNT):
        add(cut_revolve10.rotate(cirpattern1_axis, i * 360 / CIRPATTERN1_COUNT), mode=Mode.SUBTRACT)


solid = part.part
